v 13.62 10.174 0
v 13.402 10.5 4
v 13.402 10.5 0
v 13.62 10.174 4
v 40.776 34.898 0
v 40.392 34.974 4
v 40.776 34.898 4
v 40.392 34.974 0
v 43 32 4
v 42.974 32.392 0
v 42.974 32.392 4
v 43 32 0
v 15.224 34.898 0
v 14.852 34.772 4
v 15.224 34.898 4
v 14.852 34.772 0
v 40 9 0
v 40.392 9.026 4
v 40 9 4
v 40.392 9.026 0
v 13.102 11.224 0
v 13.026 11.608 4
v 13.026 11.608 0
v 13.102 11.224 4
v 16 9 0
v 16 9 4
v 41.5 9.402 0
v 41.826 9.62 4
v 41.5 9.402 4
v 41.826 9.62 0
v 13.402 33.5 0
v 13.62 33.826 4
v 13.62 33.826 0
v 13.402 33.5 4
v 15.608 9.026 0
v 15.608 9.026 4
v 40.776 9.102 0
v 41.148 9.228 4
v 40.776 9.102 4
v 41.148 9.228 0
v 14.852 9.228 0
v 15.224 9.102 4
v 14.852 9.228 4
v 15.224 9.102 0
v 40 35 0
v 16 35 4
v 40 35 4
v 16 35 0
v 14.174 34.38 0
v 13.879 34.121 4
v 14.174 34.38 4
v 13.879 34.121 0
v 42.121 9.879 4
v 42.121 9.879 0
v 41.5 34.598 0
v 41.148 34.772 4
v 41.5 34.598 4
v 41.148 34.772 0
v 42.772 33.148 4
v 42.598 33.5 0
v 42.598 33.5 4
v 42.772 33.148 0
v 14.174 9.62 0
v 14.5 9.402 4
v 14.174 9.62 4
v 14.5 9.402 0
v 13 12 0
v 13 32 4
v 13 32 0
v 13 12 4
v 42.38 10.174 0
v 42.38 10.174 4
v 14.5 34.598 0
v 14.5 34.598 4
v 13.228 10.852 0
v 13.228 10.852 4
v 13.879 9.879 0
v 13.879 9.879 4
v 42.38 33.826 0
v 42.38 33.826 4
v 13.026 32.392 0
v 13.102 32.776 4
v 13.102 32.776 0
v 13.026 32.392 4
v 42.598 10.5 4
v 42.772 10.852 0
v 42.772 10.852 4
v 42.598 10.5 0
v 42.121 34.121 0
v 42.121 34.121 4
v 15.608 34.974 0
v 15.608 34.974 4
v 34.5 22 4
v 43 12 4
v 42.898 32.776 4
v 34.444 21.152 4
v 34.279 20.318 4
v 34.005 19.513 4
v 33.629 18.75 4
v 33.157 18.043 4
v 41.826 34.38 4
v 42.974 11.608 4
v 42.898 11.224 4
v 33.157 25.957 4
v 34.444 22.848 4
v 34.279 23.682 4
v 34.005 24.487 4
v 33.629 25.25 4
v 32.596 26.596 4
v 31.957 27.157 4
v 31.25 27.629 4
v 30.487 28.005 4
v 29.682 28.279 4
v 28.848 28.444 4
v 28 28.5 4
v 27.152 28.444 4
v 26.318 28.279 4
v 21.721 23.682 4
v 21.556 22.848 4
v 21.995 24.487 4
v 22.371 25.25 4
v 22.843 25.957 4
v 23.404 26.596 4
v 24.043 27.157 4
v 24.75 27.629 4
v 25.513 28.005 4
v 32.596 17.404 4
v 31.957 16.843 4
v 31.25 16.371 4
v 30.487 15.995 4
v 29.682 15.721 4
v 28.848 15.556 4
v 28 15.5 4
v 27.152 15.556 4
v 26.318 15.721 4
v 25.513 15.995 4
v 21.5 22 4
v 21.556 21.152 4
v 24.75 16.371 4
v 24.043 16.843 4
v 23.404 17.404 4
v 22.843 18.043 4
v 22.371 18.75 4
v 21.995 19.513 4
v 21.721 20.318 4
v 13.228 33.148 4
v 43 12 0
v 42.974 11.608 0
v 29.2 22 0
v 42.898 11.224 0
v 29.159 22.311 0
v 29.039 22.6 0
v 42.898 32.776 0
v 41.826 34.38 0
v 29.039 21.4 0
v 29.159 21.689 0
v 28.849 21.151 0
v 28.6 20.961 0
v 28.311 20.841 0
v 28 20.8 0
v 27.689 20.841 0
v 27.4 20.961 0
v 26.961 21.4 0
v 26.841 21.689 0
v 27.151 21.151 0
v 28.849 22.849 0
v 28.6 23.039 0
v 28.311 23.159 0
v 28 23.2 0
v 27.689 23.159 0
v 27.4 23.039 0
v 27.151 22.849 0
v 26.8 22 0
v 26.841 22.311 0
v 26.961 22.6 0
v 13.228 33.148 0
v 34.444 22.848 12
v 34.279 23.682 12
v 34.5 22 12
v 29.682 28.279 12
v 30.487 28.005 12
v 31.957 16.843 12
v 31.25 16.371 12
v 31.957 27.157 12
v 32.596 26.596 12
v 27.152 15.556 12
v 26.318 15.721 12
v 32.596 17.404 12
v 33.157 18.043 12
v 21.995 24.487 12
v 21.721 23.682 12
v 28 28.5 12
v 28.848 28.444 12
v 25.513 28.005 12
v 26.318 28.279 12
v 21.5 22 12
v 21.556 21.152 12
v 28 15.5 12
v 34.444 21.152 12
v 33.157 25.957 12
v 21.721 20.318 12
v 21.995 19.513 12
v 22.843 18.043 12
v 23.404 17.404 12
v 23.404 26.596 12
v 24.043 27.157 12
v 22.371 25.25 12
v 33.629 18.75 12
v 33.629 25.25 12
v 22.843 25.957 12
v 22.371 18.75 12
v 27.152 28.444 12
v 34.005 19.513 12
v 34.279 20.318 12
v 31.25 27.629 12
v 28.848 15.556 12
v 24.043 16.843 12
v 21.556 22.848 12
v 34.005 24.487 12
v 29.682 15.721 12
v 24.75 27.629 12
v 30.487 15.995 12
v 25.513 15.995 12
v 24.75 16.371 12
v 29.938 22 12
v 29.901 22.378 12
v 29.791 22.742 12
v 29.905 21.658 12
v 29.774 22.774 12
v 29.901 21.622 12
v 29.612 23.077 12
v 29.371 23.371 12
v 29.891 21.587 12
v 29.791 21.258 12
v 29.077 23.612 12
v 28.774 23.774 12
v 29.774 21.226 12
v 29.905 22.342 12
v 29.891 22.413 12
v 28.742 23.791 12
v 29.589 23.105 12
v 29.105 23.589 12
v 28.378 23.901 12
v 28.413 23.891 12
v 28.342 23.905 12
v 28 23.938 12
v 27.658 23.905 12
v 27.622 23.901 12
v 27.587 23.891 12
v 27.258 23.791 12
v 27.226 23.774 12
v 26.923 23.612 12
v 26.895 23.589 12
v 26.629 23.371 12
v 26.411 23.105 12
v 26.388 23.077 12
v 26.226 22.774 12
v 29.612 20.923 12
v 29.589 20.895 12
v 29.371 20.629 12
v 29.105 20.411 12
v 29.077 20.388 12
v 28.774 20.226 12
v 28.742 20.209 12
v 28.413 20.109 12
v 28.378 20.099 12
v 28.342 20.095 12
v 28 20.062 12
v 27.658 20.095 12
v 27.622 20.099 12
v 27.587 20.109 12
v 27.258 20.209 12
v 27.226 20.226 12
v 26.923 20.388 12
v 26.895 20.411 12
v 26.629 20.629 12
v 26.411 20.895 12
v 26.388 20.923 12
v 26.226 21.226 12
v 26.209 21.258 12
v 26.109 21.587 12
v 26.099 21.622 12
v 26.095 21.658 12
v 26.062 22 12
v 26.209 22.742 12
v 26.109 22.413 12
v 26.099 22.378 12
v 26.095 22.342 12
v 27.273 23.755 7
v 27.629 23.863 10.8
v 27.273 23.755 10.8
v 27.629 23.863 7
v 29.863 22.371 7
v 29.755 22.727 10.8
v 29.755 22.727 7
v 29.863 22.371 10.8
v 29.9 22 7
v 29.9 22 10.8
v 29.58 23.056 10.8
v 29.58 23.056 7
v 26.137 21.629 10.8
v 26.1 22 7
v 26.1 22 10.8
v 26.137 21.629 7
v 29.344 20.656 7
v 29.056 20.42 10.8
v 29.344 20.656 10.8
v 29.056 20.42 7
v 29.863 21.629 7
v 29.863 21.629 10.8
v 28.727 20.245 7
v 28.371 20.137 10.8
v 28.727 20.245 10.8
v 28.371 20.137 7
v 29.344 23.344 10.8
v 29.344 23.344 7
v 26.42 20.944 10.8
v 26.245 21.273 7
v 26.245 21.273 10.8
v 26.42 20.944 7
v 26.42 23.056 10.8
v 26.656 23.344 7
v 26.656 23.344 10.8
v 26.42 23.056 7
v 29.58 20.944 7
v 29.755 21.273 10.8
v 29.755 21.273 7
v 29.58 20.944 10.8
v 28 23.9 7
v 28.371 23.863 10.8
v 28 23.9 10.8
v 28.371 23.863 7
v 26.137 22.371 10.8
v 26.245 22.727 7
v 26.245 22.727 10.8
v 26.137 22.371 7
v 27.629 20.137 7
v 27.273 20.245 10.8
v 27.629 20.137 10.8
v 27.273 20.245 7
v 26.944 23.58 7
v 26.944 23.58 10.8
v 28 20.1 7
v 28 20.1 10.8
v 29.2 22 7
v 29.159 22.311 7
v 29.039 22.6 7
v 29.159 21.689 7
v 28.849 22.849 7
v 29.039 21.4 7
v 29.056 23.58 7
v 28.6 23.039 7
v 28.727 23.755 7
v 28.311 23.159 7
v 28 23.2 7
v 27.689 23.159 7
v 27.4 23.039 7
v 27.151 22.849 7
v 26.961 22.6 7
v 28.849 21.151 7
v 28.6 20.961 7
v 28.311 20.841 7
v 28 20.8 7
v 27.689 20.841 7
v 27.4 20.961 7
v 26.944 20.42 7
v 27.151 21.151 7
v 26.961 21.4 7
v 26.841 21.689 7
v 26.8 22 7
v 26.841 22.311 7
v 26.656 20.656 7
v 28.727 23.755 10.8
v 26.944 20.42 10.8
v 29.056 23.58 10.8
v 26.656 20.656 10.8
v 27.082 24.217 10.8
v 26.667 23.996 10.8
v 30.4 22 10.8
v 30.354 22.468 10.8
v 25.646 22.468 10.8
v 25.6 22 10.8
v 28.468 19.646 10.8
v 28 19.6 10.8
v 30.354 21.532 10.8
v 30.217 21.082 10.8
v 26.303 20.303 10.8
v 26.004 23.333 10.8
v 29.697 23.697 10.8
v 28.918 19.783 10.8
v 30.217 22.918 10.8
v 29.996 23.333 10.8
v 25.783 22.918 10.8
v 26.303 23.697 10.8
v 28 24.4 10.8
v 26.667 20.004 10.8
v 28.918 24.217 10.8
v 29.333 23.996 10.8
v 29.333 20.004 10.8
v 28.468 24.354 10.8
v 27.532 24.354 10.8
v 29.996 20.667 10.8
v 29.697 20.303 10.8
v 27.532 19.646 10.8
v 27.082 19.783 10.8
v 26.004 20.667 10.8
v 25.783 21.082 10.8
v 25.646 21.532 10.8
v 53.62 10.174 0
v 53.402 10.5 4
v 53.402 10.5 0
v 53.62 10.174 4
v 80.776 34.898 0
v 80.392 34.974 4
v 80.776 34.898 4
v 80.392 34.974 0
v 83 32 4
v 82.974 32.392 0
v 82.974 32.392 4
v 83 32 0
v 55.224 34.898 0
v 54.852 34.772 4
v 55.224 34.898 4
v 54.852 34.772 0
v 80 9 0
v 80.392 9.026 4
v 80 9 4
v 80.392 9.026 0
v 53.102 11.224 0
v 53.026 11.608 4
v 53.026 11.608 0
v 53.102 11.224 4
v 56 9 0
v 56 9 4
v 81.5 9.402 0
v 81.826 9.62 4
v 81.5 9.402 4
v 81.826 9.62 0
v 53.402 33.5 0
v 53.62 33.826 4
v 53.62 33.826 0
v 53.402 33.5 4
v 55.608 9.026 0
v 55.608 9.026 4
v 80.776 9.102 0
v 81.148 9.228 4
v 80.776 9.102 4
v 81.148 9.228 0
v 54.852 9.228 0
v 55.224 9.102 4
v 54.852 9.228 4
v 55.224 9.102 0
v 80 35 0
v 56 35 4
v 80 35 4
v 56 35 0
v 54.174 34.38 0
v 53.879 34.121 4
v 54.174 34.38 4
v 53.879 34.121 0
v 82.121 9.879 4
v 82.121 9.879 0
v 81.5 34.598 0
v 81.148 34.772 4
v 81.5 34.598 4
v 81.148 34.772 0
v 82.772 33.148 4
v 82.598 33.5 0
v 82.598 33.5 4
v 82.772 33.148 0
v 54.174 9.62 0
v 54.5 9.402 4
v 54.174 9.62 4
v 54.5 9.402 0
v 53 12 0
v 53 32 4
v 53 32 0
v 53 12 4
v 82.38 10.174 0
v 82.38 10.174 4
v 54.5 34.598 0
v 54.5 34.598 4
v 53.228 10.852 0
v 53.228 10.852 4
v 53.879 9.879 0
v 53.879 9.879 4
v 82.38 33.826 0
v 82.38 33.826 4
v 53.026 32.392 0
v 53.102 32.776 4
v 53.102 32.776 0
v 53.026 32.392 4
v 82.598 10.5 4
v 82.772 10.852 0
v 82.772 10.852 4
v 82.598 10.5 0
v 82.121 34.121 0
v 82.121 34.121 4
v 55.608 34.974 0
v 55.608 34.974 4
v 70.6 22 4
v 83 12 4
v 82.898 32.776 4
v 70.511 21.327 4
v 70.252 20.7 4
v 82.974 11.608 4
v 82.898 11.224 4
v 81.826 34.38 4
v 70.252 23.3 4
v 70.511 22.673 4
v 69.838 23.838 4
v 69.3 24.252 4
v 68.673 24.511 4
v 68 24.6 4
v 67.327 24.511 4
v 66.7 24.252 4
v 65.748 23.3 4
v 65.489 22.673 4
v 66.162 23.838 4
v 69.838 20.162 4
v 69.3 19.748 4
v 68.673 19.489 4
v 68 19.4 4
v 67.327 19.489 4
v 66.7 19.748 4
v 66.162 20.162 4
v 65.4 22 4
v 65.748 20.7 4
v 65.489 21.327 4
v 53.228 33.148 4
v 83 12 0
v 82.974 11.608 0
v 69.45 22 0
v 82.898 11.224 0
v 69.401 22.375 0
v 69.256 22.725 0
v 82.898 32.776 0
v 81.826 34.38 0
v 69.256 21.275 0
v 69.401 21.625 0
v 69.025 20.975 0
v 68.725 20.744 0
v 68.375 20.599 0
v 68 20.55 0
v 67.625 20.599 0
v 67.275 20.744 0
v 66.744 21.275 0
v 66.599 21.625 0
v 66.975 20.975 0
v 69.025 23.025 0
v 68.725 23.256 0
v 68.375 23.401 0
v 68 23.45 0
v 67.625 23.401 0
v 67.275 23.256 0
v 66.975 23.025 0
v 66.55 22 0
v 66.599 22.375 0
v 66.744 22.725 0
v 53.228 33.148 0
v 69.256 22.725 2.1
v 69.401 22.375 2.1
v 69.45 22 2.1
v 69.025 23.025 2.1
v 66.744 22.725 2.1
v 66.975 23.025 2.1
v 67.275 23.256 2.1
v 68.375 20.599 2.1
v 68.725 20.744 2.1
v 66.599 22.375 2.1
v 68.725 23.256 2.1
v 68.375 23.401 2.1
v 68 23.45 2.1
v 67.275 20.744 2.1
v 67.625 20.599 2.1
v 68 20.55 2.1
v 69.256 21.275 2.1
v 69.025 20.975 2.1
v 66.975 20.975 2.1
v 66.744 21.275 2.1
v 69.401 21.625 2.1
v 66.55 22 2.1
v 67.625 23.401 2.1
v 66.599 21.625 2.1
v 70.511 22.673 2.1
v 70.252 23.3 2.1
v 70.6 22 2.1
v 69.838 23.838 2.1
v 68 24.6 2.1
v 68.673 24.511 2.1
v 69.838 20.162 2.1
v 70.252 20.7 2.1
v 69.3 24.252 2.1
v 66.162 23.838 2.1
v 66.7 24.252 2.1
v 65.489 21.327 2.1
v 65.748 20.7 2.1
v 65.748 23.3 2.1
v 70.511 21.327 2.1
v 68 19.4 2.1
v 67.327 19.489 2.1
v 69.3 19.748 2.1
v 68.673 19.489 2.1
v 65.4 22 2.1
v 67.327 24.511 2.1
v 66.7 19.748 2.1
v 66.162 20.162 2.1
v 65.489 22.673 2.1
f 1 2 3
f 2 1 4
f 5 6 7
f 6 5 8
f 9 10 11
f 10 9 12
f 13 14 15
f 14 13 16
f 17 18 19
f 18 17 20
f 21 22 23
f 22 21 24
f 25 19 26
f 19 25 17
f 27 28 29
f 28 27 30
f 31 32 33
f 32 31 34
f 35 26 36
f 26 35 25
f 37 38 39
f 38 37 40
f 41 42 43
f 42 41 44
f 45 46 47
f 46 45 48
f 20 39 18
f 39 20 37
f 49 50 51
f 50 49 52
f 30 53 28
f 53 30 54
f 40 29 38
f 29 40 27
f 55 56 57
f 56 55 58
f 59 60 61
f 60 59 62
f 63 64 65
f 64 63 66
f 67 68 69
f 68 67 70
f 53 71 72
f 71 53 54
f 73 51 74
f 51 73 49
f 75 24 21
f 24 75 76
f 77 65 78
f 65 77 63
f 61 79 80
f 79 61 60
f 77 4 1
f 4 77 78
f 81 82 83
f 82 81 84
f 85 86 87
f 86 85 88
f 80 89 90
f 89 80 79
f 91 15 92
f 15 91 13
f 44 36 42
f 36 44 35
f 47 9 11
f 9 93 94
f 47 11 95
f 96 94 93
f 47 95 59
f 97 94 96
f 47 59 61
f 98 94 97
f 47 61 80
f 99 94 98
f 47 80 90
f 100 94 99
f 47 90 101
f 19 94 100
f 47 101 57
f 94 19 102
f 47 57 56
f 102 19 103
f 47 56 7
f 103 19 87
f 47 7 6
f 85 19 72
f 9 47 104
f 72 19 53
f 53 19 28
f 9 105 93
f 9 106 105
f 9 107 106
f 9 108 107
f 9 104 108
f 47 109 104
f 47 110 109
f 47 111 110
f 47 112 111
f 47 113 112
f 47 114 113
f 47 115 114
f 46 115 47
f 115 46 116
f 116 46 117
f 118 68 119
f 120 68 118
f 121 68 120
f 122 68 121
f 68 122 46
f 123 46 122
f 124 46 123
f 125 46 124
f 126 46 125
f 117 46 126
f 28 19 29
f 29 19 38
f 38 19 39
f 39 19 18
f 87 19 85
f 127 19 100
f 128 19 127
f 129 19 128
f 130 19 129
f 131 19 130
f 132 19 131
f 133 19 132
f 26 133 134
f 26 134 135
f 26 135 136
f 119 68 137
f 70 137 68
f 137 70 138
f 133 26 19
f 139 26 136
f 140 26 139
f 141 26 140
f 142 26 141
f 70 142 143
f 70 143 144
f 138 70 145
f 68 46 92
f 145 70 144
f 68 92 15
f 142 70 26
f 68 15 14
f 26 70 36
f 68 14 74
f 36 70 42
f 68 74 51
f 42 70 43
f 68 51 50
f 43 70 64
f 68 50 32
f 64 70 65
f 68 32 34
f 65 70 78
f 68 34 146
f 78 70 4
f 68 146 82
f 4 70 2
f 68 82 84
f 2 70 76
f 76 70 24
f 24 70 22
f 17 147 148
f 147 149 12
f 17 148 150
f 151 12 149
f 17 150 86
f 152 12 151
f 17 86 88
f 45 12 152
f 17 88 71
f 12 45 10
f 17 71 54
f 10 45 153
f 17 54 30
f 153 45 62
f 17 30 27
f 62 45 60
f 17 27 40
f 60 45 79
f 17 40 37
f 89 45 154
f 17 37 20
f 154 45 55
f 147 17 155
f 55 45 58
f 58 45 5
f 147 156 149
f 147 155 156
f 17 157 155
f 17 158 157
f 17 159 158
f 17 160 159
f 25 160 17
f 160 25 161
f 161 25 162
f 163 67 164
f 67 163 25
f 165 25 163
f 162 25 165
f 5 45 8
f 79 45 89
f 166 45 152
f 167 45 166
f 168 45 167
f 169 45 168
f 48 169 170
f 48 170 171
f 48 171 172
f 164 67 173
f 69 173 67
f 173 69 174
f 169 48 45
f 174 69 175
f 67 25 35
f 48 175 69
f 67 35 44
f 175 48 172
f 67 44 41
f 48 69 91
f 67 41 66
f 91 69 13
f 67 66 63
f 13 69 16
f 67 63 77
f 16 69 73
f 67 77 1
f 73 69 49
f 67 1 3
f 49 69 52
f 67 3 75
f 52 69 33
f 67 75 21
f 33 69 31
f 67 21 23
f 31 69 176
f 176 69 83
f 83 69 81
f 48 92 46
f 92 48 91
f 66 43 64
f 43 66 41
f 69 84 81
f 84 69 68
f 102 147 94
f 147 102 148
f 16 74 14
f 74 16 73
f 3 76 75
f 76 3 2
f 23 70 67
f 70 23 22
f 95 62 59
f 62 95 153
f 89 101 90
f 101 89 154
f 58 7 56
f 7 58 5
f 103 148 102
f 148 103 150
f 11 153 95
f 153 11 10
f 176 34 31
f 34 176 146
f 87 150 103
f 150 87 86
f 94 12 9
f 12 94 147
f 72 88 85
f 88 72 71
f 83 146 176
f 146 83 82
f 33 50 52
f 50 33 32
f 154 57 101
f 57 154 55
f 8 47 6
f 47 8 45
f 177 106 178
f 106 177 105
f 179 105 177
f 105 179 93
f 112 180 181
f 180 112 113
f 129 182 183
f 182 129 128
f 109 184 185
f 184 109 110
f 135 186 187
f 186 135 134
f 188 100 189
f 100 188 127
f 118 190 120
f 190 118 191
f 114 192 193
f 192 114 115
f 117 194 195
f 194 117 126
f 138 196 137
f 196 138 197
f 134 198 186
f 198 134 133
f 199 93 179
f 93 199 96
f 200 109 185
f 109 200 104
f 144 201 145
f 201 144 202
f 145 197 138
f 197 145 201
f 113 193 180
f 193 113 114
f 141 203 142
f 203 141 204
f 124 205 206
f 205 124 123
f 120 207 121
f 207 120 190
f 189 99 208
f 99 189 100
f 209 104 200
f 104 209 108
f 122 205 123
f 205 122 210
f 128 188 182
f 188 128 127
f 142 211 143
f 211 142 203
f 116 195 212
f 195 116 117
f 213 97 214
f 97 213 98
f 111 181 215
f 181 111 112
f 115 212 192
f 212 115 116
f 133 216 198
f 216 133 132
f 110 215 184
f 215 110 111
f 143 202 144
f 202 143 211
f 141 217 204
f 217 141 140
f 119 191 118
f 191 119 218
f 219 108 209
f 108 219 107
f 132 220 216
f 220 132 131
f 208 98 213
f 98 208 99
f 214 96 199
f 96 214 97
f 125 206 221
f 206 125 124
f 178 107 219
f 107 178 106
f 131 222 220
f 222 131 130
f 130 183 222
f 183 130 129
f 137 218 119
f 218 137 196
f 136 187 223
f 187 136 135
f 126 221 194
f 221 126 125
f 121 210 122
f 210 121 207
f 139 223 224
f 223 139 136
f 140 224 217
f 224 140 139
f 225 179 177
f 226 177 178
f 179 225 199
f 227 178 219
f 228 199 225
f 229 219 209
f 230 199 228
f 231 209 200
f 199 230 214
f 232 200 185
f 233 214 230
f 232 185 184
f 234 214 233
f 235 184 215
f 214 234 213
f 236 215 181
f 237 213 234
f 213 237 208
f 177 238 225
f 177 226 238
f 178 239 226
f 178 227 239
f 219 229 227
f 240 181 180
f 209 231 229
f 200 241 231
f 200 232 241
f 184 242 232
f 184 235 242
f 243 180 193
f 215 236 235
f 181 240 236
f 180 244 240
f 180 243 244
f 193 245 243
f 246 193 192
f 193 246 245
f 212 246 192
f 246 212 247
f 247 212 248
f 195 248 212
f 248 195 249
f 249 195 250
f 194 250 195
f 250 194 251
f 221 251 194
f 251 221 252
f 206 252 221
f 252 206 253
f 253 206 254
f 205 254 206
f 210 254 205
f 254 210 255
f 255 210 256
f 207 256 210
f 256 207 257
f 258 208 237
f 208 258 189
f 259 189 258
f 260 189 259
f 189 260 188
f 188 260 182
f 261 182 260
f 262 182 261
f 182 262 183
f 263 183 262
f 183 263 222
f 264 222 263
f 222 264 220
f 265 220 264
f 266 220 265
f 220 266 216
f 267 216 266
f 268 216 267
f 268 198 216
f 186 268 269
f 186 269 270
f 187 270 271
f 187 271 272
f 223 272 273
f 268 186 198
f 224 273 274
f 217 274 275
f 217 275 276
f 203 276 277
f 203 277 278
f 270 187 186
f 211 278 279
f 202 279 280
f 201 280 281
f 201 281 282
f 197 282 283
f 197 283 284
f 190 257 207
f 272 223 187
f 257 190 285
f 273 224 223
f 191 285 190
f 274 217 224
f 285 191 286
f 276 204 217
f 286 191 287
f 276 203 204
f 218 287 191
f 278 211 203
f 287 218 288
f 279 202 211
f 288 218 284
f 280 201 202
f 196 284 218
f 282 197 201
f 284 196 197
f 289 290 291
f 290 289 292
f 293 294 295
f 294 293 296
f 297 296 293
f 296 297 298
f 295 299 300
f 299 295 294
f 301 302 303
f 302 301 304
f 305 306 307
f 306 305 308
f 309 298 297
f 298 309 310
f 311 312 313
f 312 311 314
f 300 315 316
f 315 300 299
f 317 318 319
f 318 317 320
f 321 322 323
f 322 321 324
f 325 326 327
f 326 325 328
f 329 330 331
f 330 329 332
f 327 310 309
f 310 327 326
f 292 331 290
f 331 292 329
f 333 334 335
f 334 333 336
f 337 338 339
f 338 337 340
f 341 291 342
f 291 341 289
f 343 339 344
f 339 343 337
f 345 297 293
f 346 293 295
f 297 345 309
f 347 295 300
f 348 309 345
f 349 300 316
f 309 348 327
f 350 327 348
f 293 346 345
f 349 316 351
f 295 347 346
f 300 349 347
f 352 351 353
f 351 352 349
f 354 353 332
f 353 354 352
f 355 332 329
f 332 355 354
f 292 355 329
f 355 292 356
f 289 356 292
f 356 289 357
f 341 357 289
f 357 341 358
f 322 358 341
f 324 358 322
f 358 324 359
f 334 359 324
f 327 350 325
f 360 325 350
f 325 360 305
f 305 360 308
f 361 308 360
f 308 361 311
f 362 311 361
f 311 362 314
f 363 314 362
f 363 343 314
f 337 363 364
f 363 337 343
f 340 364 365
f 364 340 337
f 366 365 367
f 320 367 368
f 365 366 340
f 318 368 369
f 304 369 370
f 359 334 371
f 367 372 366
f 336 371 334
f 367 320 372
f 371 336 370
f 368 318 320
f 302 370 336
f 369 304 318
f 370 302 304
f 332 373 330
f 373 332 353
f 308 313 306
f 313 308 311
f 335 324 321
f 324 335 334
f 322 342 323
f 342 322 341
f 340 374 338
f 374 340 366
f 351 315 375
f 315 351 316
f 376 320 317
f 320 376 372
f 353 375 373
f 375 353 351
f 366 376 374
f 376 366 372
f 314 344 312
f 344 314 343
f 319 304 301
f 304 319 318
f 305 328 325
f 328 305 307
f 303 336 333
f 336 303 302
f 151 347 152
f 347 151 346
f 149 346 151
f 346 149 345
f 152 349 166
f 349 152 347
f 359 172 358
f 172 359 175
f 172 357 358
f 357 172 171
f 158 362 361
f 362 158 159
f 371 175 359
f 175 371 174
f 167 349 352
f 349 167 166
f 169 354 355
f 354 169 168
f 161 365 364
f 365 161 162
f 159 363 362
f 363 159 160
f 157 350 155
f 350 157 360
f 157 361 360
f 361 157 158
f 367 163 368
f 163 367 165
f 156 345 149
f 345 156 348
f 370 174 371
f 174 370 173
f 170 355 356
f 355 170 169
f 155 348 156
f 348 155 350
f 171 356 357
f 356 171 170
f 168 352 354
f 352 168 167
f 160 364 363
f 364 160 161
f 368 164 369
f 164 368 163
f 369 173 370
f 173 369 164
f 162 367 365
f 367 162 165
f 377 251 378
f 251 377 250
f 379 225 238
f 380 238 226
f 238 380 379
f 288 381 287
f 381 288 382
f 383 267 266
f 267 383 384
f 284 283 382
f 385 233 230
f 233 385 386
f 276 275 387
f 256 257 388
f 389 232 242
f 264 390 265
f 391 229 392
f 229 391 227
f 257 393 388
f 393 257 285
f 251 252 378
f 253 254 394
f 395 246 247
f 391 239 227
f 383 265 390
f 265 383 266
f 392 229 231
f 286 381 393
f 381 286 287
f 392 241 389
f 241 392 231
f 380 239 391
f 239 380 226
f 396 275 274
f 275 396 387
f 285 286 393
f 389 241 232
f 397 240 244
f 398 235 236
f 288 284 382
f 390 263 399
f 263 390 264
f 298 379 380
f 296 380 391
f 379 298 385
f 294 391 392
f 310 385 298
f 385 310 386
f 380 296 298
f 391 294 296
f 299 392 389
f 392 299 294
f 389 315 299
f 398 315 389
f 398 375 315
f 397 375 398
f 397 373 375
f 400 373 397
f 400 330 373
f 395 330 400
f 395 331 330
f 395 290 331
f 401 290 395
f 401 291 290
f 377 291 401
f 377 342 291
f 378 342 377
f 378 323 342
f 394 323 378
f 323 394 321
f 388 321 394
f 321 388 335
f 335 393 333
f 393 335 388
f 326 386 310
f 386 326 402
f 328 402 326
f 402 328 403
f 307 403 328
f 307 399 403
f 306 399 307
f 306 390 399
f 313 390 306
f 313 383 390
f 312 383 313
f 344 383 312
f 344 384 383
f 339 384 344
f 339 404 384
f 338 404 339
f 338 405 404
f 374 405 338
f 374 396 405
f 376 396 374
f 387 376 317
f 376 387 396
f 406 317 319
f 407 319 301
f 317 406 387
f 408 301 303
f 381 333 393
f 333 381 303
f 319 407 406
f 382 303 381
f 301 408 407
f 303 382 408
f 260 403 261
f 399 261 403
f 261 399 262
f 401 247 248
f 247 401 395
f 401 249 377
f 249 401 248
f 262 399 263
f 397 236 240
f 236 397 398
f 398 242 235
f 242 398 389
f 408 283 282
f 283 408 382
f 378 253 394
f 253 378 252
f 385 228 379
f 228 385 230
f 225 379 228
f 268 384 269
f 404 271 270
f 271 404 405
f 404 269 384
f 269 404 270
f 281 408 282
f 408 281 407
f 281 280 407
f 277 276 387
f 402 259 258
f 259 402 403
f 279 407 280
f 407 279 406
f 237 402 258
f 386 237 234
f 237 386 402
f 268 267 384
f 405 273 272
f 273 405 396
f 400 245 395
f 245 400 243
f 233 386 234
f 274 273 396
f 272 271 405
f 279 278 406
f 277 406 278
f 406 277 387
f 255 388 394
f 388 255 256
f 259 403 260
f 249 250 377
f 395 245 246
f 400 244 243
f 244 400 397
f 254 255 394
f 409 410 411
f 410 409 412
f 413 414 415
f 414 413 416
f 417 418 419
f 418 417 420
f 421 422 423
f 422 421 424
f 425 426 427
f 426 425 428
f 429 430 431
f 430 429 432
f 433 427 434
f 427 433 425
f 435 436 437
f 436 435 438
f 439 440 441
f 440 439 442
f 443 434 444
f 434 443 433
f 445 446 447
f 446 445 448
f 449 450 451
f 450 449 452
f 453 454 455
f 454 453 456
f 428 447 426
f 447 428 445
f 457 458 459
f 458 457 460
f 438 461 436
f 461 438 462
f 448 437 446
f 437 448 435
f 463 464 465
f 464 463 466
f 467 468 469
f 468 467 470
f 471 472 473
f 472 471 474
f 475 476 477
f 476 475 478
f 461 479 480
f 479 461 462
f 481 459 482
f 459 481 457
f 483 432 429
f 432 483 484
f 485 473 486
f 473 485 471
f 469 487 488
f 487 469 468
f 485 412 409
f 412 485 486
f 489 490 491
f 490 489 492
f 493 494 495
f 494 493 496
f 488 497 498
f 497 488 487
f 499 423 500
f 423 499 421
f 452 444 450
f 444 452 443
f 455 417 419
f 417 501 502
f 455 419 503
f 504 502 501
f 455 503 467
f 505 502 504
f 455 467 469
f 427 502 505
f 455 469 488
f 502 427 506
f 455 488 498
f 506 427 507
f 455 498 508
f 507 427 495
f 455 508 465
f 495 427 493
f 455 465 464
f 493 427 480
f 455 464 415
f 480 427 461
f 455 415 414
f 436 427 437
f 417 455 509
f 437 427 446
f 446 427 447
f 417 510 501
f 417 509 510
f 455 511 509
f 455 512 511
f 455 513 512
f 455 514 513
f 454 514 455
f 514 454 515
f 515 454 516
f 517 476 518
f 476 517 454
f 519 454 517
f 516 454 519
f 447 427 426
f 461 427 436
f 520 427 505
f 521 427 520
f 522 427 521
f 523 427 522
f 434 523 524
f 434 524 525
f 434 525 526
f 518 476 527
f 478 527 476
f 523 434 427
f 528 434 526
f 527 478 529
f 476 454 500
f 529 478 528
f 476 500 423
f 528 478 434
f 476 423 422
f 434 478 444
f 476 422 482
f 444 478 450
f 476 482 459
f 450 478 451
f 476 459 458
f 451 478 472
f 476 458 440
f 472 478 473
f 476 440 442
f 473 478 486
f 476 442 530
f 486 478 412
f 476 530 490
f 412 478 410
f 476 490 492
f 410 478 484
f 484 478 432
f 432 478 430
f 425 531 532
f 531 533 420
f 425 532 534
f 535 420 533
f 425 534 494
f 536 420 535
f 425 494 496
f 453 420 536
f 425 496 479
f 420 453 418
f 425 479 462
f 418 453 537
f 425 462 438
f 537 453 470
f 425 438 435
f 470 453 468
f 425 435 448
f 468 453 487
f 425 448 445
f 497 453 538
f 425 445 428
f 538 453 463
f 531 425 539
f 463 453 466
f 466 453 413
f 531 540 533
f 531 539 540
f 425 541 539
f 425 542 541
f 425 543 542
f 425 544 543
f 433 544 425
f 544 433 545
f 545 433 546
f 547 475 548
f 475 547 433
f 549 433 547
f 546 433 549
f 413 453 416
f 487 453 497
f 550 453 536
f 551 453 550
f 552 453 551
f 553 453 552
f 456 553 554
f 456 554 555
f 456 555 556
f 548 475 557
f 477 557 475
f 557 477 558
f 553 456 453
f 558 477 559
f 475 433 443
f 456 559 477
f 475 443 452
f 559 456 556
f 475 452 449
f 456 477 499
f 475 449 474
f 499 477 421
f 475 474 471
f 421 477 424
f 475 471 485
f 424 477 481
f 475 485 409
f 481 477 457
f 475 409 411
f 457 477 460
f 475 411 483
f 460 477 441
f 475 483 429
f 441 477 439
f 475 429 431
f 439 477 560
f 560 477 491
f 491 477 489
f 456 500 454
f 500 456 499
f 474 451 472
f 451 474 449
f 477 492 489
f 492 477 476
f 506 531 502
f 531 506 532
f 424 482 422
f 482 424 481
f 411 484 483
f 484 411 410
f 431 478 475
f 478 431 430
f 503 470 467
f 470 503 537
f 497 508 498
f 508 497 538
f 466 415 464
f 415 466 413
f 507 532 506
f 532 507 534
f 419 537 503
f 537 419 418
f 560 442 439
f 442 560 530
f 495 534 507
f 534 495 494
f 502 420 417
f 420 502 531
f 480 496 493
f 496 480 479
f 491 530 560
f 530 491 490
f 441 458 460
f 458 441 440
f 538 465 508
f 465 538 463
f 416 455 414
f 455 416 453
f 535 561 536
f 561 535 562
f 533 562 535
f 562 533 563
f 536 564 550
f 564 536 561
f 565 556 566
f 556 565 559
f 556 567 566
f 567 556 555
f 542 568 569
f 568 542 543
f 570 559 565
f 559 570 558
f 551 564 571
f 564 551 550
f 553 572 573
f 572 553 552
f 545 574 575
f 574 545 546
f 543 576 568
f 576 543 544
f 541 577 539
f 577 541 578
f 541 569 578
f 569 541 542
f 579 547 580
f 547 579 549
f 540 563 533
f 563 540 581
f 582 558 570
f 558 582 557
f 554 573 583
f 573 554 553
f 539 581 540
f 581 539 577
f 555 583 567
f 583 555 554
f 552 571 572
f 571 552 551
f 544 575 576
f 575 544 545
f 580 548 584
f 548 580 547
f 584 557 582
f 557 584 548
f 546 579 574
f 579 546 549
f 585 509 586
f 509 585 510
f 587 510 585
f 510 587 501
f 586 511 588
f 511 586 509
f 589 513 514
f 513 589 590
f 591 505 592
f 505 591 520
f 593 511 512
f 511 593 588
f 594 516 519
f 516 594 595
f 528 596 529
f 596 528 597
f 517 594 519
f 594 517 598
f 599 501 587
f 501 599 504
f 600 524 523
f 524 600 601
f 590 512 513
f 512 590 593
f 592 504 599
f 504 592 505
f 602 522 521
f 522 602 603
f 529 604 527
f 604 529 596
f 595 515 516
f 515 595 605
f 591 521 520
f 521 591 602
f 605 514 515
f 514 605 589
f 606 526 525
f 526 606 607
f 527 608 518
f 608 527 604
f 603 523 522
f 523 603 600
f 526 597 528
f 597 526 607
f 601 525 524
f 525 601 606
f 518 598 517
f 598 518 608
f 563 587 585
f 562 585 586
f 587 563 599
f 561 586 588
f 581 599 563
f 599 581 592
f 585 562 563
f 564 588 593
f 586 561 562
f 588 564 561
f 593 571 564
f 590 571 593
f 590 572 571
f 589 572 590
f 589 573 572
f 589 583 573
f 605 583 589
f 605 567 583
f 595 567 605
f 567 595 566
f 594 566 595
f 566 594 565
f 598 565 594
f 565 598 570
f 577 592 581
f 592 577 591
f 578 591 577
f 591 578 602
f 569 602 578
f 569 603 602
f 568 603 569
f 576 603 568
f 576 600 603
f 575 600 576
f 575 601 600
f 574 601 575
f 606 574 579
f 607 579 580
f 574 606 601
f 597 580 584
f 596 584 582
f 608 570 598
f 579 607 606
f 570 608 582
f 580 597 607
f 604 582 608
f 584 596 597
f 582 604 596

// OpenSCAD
/*
Sample 062: Heizeinsatz-Schraubprobe — M2,5
Generated from the FDM Mechanical Sample Library.
Units: millimetres.

Override examples:
  openscad -o custom.stl -D 'view="plate"' -D 'render_fn=64' model.scad
  openscad -o preview.png -D 'view="assembly"' model.scad
*/
use <../../../library/fdm_mechanisms.scad>

render_fn = is_undef(render_fn) ? 48 : render_fn;
view = is_undef(view) ? "plate" : view;
$fn = render_fn;

sample_heatset_insert(
    view=view,
    pilot_d=3.8,
    screw_clear=2.9,
    head_d=5.2,
    insert_depth=5
);
